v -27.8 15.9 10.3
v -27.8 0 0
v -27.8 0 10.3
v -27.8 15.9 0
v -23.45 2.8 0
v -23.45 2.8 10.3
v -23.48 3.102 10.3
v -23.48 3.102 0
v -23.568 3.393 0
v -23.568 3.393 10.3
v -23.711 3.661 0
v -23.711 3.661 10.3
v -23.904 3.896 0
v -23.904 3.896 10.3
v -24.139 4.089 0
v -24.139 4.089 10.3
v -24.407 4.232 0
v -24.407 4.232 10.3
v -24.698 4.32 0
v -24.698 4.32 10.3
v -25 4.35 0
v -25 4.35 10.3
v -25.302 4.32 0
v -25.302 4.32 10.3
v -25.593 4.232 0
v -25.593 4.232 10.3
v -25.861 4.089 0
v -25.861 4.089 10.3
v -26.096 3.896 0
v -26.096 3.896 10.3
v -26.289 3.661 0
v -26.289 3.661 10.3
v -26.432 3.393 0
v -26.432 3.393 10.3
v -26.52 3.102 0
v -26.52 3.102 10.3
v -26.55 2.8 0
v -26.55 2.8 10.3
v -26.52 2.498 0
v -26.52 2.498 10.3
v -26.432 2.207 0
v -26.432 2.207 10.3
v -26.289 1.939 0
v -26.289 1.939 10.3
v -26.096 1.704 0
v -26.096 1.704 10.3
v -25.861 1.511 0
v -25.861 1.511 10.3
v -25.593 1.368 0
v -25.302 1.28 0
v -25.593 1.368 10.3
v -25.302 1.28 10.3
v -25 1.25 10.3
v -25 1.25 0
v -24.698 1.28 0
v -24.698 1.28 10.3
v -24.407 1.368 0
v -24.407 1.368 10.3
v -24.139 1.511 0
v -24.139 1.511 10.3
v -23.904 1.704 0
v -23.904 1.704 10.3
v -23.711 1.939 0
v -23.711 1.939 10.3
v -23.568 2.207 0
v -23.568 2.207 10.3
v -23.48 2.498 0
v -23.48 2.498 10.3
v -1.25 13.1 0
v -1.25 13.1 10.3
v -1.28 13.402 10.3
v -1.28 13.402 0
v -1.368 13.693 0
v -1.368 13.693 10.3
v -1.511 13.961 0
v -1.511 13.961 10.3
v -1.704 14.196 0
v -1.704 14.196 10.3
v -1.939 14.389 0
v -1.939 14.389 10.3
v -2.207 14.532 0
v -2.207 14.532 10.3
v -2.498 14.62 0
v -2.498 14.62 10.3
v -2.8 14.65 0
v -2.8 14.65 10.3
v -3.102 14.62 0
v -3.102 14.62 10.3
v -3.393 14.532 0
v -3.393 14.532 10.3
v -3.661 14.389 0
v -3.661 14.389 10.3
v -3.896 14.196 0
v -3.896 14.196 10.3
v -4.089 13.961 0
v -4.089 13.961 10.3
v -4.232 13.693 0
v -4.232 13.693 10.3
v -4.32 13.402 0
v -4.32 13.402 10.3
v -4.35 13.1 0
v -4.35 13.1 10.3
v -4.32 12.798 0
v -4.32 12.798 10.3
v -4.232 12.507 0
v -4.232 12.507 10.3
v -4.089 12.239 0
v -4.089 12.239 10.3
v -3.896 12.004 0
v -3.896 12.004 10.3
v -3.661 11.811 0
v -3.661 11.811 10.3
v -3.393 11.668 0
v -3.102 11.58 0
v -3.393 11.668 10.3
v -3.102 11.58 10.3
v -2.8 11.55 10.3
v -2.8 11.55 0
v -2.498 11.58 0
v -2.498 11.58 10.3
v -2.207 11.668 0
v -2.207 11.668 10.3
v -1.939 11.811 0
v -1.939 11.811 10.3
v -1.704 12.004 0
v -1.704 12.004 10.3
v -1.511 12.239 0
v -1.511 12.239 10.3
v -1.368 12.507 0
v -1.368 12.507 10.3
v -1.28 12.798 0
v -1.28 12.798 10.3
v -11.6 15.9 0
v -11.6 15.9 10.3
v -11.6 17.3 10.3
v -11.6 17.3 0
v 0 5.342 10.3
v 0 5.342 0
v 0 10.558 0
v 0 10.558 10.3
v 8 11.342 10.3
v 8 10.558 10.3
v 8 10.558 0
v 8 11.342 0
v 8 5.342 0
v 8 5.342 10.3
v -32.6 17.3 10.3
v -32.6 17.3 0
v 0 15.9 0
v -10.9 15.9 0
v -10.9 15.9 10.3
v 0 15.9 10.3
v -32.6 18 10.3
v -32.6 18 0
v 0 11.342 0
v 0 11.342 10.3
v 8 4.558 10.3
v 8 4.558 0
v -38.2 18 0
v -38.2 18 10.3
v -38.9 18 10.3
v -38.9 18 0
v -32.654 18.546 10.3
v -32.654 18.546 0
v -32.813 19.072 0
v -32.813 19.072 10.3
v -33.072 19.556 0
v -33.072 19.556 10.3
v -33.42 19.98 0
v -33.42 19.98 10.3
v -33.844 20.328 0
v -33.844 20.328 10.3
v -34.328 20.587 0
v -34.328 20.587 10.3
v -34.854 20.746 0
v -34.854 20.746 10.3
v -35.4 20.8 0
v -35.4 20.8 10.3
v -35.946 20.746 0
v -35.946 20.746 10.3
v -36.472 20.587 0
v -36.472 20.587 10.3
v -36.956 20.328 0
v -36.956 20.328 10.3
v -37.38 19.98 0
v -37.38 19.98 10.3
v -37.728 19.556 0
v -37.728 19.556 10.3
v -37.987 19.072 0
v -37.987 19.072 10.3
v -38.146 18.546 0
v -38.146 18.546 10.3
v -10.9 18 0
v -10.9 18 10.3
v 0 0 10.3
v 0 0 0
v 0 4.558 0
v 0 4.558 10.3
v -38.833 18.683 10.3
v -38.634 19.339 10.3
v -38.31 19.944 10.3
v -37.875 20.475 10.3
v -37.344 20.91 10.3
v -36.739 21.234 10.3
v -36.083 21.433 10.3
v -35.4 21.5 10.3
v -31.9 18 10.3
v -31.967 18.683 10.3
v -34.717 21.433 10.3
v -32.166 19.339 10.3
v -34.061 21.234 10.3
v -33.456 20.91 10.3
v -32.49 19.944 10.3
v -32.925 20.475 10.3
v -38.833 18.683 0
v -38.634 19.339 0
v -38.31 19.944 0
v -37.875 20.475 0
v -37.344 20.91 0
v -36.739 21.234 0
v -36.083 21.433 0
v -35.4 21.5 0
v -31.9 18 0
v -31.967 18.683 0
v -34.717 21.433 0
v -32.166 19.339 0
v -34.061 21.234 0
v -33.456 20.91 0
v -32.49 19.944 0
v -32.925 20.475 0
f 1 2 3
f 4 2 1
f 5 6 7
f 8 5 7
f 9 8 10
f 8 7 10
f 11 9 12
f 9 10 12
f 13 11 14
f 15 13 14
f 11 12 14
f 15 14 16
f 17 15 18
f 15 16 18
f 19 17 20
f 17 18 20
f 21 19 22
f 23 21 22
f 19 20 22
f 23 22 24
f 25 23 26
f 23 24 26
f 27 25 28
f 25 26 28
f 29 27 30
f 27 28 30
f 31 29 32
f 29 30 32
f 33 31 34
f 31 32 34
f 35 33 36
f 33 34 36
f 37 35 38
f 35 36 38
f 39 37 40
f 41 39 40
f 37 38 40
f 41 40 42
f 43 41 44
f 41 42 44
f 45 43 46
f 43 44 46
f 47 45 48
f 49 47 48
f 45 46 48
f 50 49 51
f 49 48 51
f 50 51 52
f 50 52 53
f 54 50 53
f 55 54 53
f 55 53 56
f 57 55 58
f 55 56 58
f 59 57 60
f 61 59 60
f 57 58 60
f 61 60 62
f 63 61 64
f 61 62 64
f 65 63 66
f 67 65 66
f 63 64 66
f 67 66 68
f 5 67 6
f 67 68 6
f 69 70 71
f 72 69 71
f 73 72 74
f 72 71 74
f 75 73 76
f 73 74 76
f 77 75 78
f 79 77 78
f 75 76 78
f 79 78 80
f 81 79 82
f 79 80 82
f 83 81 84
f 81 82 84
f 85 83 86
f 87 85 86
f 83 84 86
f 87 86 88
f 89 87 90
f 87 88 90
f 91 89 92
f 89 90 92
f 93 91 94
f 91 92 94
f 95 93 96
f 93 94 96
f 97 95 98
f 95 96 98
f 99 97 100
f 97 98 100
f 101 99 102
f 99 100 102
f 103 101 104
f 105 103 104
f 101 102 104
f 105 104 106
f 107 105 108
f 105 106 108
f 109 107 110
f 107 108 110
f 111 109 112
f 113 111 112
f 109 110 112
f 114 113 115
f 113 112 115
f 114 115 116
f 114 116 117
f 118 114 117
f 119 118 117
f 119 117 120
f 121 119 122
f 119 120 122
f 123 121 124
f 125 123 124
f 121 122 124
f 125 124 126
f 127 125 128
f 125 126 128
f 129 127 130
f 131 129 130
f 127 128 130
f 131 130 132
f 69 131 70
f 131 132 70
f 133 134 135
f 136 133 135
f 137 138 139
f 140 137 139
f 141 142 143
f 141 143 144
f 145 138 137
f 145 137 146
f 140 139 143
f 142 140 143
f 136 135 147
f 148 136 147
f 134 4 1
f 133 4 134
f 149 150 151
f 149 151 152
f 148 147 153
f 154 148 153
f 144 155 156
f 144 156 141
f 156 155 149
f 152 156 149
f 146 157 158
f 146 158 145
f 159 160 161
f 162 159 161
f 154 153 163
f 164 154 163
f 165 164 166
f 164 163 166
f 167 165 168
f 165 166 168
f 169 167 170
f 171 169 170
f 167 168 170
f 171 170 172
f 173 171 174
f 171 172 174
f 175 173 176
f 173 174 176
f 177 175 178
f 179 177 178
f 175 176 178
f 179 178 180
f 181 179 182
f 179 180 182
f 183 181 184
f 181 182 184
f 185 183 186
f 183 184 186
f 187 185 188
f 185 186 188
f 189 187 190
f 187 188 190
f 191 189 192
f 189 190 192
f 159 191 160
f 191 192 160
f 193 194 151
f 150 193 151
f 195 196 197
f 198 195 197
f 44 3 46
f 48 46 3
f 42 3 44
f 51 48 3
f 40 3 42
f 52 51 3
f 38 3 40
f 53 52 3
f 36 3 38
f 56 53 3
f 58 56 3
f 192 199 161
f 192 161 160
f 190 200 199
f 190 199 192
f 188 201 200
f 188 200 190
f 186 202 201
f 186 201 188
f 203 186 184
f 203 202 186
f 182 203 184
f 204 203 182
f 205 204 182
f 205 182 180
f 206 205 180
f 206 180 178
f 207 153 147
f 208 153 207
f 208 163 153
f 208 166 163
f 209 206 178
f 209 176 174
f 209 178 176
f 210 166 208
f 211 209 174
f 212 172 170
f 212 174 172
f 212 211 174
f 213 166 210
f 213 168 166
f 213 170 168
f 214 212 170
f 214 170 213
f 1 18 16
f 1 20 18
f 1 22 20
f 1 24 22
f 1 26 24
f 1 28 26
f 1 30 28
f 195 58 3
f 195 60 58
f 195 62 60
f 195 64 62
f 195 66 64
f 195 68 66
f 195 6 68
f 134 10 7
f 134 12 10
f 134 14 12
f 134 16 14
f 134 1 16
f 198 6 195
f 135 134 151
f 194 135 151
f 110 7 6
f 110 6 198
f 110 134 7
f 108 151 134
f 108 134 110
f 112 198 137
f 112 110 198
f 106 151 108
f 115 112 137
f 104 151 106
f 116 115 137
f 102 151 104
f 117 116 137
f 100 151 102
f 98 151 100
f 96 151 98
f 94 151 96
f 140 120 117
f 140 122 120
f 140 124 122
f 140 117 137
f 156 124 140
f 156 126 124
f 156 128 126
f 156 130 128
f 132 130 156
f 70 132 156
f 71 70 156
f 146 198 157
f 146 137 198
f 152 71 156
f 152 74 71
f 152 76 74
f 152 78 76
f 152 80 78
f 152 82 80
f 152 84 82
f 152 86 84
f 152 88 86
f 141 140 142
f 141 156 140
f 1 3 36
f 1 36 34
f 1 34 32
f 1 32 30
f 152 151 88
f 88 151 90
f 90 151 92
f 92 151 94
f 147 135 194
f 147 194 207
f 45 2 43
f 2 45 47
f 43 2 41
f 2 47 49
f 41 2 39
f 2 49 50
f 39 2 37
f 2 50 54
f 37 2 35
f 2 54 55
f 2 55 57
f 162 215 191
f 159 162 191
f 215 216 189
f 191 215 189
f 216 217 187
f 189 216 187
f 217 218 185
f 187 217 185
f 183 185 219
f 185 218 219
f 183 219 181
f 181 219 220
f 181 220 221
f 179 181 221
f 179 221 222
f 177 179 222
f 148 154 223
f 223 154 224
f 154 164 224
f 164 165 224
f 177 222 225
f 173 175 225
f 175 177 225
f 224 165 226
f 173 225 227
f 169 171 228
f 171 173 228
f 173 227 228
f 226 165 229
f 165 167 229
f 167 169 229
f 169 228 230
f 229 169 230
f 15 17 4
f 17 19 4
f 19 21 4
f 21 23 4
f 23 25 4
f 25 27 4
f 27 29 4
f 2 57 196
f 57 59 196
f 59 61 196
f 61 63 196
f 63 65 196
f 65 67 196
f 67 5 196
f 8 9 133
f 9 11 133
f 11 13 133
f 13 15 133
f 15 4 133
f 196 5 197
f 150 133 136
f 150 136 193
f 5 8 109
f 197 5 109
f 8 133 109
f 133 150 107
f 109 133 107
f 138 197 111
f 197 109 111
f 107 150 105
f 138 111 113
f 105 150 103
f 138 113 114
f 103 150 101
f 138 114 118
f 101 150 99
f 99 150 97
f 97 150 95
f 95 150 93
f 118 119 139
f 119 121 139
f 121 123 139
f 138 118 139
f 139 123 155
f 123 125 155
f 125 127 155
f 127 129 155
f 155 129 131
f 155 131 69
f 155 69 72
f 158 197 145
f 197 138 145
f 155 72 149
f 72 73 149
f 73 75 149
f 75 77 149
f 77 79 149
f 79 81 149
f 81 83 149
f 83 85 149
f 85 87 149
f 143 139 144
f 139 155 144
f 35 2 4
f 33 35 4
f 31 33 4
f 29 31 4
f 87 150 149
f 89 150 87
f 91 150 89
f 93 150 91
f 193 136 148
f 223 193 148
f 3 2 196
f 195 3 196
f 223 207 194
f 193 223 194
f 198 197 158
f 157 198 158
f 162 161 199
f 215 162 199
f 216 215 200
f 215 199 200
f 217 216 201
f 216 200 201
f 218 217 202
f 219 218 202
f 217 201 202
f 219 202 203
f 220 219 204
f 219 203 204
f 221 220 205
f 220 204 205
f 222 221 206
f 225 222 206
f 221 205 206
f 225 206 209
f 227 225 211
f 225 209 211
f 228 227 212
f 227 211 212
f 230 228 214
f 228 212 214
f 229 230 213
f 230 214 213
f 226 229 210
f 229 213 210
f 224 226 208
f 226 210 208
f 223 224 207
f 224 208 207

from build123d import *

# Parameters (mm, degrees)
SKETCH_3_W          = 27.8
SKETCH_3_H          = 15.9
EXTRUDE_1_DEPTH     = 10.3
SKETCH_4_R          = 1.55
CUT_EXTRUDE_1_DEPTH = 10.3
SKETCH_5_W          = 8
SKETCH_5_H          = 0.784988322
EXTRUDE_2_DEPTH     = 10.3
EXTRUDE_3_DEPTH     = 10.3


with BuildPart() as part:
    # 草图3 → 凸台-拉伸1 (new body)
    with BuildSketch(Plane.XY):
        with Locations((-13.9, 7.95)):
            Rectangle(SKETCH_3_W, SKETCH_3_H)
    extrude(amount=EXTRUDE_1_DEPTH)

    # 草图4 → 切除-拉伸1 (cut)
    with BuildSketch(Plane.XY.offset(10.3)):
        with Locations((-2.8, 13.1)):
            Circle(SKETCH_4_R)
        with Locations((-25, 2.8)):
            Circle(SKETCH_4_R)
    extrude(amount=-CUT_EXTRUDE_1_DEPTH, mode=Mode.SUBTRACT)

    # 草图5 → 凸台-拉伸2 (add)
    with BuildSketch(Plane.XY.offset(10.3)):
        with Locations((4, 10.95)):
            Rectangle(SKETCH_5_W, SKETCH_5_H)
        with Locations((4, 4.95)):
            Rectangle(SKETCH_5_W, SKETCH_5_H)
    extrude(amount=-EXTRUDE_2_DEPTH)

    # 草图6 → 凸台-拉伸3 (add)
    with BuildSketch(Plane.XY.offset(10.3)):
        with BuildLine():
            Line((-31.9, 18), (-22.452464215, 18))
            Line((-22.452464215, 18), (-10.9, 18))
            Line((-10.9, 18), (-10.9, 15.9))
            Line((-10.9, 15.9), (-11.6, 15.9))
            Line((-11.6, 15.9), (-11.6, 17.3))
            Line((-11.6, 17.3), (-31.896338759, 17.3))
            Line((-31.896338759, 17.3), (-32.6, 17.3))
            Line((-32.6, 17.3), (-32.6, 18))
            ThreePointArc((-32.6, 18), (-35.4, 20.8), (-38.2, 18))
            Line((-38.2, 18), (-38.9, 18))
            ThreePointArc((-38.9, 18), (-35.4, 21.5), (-31.9, 18))
        make_face()
    extrude(amount=-EXTRUDE_3_DEPTH)


solid = part.part
